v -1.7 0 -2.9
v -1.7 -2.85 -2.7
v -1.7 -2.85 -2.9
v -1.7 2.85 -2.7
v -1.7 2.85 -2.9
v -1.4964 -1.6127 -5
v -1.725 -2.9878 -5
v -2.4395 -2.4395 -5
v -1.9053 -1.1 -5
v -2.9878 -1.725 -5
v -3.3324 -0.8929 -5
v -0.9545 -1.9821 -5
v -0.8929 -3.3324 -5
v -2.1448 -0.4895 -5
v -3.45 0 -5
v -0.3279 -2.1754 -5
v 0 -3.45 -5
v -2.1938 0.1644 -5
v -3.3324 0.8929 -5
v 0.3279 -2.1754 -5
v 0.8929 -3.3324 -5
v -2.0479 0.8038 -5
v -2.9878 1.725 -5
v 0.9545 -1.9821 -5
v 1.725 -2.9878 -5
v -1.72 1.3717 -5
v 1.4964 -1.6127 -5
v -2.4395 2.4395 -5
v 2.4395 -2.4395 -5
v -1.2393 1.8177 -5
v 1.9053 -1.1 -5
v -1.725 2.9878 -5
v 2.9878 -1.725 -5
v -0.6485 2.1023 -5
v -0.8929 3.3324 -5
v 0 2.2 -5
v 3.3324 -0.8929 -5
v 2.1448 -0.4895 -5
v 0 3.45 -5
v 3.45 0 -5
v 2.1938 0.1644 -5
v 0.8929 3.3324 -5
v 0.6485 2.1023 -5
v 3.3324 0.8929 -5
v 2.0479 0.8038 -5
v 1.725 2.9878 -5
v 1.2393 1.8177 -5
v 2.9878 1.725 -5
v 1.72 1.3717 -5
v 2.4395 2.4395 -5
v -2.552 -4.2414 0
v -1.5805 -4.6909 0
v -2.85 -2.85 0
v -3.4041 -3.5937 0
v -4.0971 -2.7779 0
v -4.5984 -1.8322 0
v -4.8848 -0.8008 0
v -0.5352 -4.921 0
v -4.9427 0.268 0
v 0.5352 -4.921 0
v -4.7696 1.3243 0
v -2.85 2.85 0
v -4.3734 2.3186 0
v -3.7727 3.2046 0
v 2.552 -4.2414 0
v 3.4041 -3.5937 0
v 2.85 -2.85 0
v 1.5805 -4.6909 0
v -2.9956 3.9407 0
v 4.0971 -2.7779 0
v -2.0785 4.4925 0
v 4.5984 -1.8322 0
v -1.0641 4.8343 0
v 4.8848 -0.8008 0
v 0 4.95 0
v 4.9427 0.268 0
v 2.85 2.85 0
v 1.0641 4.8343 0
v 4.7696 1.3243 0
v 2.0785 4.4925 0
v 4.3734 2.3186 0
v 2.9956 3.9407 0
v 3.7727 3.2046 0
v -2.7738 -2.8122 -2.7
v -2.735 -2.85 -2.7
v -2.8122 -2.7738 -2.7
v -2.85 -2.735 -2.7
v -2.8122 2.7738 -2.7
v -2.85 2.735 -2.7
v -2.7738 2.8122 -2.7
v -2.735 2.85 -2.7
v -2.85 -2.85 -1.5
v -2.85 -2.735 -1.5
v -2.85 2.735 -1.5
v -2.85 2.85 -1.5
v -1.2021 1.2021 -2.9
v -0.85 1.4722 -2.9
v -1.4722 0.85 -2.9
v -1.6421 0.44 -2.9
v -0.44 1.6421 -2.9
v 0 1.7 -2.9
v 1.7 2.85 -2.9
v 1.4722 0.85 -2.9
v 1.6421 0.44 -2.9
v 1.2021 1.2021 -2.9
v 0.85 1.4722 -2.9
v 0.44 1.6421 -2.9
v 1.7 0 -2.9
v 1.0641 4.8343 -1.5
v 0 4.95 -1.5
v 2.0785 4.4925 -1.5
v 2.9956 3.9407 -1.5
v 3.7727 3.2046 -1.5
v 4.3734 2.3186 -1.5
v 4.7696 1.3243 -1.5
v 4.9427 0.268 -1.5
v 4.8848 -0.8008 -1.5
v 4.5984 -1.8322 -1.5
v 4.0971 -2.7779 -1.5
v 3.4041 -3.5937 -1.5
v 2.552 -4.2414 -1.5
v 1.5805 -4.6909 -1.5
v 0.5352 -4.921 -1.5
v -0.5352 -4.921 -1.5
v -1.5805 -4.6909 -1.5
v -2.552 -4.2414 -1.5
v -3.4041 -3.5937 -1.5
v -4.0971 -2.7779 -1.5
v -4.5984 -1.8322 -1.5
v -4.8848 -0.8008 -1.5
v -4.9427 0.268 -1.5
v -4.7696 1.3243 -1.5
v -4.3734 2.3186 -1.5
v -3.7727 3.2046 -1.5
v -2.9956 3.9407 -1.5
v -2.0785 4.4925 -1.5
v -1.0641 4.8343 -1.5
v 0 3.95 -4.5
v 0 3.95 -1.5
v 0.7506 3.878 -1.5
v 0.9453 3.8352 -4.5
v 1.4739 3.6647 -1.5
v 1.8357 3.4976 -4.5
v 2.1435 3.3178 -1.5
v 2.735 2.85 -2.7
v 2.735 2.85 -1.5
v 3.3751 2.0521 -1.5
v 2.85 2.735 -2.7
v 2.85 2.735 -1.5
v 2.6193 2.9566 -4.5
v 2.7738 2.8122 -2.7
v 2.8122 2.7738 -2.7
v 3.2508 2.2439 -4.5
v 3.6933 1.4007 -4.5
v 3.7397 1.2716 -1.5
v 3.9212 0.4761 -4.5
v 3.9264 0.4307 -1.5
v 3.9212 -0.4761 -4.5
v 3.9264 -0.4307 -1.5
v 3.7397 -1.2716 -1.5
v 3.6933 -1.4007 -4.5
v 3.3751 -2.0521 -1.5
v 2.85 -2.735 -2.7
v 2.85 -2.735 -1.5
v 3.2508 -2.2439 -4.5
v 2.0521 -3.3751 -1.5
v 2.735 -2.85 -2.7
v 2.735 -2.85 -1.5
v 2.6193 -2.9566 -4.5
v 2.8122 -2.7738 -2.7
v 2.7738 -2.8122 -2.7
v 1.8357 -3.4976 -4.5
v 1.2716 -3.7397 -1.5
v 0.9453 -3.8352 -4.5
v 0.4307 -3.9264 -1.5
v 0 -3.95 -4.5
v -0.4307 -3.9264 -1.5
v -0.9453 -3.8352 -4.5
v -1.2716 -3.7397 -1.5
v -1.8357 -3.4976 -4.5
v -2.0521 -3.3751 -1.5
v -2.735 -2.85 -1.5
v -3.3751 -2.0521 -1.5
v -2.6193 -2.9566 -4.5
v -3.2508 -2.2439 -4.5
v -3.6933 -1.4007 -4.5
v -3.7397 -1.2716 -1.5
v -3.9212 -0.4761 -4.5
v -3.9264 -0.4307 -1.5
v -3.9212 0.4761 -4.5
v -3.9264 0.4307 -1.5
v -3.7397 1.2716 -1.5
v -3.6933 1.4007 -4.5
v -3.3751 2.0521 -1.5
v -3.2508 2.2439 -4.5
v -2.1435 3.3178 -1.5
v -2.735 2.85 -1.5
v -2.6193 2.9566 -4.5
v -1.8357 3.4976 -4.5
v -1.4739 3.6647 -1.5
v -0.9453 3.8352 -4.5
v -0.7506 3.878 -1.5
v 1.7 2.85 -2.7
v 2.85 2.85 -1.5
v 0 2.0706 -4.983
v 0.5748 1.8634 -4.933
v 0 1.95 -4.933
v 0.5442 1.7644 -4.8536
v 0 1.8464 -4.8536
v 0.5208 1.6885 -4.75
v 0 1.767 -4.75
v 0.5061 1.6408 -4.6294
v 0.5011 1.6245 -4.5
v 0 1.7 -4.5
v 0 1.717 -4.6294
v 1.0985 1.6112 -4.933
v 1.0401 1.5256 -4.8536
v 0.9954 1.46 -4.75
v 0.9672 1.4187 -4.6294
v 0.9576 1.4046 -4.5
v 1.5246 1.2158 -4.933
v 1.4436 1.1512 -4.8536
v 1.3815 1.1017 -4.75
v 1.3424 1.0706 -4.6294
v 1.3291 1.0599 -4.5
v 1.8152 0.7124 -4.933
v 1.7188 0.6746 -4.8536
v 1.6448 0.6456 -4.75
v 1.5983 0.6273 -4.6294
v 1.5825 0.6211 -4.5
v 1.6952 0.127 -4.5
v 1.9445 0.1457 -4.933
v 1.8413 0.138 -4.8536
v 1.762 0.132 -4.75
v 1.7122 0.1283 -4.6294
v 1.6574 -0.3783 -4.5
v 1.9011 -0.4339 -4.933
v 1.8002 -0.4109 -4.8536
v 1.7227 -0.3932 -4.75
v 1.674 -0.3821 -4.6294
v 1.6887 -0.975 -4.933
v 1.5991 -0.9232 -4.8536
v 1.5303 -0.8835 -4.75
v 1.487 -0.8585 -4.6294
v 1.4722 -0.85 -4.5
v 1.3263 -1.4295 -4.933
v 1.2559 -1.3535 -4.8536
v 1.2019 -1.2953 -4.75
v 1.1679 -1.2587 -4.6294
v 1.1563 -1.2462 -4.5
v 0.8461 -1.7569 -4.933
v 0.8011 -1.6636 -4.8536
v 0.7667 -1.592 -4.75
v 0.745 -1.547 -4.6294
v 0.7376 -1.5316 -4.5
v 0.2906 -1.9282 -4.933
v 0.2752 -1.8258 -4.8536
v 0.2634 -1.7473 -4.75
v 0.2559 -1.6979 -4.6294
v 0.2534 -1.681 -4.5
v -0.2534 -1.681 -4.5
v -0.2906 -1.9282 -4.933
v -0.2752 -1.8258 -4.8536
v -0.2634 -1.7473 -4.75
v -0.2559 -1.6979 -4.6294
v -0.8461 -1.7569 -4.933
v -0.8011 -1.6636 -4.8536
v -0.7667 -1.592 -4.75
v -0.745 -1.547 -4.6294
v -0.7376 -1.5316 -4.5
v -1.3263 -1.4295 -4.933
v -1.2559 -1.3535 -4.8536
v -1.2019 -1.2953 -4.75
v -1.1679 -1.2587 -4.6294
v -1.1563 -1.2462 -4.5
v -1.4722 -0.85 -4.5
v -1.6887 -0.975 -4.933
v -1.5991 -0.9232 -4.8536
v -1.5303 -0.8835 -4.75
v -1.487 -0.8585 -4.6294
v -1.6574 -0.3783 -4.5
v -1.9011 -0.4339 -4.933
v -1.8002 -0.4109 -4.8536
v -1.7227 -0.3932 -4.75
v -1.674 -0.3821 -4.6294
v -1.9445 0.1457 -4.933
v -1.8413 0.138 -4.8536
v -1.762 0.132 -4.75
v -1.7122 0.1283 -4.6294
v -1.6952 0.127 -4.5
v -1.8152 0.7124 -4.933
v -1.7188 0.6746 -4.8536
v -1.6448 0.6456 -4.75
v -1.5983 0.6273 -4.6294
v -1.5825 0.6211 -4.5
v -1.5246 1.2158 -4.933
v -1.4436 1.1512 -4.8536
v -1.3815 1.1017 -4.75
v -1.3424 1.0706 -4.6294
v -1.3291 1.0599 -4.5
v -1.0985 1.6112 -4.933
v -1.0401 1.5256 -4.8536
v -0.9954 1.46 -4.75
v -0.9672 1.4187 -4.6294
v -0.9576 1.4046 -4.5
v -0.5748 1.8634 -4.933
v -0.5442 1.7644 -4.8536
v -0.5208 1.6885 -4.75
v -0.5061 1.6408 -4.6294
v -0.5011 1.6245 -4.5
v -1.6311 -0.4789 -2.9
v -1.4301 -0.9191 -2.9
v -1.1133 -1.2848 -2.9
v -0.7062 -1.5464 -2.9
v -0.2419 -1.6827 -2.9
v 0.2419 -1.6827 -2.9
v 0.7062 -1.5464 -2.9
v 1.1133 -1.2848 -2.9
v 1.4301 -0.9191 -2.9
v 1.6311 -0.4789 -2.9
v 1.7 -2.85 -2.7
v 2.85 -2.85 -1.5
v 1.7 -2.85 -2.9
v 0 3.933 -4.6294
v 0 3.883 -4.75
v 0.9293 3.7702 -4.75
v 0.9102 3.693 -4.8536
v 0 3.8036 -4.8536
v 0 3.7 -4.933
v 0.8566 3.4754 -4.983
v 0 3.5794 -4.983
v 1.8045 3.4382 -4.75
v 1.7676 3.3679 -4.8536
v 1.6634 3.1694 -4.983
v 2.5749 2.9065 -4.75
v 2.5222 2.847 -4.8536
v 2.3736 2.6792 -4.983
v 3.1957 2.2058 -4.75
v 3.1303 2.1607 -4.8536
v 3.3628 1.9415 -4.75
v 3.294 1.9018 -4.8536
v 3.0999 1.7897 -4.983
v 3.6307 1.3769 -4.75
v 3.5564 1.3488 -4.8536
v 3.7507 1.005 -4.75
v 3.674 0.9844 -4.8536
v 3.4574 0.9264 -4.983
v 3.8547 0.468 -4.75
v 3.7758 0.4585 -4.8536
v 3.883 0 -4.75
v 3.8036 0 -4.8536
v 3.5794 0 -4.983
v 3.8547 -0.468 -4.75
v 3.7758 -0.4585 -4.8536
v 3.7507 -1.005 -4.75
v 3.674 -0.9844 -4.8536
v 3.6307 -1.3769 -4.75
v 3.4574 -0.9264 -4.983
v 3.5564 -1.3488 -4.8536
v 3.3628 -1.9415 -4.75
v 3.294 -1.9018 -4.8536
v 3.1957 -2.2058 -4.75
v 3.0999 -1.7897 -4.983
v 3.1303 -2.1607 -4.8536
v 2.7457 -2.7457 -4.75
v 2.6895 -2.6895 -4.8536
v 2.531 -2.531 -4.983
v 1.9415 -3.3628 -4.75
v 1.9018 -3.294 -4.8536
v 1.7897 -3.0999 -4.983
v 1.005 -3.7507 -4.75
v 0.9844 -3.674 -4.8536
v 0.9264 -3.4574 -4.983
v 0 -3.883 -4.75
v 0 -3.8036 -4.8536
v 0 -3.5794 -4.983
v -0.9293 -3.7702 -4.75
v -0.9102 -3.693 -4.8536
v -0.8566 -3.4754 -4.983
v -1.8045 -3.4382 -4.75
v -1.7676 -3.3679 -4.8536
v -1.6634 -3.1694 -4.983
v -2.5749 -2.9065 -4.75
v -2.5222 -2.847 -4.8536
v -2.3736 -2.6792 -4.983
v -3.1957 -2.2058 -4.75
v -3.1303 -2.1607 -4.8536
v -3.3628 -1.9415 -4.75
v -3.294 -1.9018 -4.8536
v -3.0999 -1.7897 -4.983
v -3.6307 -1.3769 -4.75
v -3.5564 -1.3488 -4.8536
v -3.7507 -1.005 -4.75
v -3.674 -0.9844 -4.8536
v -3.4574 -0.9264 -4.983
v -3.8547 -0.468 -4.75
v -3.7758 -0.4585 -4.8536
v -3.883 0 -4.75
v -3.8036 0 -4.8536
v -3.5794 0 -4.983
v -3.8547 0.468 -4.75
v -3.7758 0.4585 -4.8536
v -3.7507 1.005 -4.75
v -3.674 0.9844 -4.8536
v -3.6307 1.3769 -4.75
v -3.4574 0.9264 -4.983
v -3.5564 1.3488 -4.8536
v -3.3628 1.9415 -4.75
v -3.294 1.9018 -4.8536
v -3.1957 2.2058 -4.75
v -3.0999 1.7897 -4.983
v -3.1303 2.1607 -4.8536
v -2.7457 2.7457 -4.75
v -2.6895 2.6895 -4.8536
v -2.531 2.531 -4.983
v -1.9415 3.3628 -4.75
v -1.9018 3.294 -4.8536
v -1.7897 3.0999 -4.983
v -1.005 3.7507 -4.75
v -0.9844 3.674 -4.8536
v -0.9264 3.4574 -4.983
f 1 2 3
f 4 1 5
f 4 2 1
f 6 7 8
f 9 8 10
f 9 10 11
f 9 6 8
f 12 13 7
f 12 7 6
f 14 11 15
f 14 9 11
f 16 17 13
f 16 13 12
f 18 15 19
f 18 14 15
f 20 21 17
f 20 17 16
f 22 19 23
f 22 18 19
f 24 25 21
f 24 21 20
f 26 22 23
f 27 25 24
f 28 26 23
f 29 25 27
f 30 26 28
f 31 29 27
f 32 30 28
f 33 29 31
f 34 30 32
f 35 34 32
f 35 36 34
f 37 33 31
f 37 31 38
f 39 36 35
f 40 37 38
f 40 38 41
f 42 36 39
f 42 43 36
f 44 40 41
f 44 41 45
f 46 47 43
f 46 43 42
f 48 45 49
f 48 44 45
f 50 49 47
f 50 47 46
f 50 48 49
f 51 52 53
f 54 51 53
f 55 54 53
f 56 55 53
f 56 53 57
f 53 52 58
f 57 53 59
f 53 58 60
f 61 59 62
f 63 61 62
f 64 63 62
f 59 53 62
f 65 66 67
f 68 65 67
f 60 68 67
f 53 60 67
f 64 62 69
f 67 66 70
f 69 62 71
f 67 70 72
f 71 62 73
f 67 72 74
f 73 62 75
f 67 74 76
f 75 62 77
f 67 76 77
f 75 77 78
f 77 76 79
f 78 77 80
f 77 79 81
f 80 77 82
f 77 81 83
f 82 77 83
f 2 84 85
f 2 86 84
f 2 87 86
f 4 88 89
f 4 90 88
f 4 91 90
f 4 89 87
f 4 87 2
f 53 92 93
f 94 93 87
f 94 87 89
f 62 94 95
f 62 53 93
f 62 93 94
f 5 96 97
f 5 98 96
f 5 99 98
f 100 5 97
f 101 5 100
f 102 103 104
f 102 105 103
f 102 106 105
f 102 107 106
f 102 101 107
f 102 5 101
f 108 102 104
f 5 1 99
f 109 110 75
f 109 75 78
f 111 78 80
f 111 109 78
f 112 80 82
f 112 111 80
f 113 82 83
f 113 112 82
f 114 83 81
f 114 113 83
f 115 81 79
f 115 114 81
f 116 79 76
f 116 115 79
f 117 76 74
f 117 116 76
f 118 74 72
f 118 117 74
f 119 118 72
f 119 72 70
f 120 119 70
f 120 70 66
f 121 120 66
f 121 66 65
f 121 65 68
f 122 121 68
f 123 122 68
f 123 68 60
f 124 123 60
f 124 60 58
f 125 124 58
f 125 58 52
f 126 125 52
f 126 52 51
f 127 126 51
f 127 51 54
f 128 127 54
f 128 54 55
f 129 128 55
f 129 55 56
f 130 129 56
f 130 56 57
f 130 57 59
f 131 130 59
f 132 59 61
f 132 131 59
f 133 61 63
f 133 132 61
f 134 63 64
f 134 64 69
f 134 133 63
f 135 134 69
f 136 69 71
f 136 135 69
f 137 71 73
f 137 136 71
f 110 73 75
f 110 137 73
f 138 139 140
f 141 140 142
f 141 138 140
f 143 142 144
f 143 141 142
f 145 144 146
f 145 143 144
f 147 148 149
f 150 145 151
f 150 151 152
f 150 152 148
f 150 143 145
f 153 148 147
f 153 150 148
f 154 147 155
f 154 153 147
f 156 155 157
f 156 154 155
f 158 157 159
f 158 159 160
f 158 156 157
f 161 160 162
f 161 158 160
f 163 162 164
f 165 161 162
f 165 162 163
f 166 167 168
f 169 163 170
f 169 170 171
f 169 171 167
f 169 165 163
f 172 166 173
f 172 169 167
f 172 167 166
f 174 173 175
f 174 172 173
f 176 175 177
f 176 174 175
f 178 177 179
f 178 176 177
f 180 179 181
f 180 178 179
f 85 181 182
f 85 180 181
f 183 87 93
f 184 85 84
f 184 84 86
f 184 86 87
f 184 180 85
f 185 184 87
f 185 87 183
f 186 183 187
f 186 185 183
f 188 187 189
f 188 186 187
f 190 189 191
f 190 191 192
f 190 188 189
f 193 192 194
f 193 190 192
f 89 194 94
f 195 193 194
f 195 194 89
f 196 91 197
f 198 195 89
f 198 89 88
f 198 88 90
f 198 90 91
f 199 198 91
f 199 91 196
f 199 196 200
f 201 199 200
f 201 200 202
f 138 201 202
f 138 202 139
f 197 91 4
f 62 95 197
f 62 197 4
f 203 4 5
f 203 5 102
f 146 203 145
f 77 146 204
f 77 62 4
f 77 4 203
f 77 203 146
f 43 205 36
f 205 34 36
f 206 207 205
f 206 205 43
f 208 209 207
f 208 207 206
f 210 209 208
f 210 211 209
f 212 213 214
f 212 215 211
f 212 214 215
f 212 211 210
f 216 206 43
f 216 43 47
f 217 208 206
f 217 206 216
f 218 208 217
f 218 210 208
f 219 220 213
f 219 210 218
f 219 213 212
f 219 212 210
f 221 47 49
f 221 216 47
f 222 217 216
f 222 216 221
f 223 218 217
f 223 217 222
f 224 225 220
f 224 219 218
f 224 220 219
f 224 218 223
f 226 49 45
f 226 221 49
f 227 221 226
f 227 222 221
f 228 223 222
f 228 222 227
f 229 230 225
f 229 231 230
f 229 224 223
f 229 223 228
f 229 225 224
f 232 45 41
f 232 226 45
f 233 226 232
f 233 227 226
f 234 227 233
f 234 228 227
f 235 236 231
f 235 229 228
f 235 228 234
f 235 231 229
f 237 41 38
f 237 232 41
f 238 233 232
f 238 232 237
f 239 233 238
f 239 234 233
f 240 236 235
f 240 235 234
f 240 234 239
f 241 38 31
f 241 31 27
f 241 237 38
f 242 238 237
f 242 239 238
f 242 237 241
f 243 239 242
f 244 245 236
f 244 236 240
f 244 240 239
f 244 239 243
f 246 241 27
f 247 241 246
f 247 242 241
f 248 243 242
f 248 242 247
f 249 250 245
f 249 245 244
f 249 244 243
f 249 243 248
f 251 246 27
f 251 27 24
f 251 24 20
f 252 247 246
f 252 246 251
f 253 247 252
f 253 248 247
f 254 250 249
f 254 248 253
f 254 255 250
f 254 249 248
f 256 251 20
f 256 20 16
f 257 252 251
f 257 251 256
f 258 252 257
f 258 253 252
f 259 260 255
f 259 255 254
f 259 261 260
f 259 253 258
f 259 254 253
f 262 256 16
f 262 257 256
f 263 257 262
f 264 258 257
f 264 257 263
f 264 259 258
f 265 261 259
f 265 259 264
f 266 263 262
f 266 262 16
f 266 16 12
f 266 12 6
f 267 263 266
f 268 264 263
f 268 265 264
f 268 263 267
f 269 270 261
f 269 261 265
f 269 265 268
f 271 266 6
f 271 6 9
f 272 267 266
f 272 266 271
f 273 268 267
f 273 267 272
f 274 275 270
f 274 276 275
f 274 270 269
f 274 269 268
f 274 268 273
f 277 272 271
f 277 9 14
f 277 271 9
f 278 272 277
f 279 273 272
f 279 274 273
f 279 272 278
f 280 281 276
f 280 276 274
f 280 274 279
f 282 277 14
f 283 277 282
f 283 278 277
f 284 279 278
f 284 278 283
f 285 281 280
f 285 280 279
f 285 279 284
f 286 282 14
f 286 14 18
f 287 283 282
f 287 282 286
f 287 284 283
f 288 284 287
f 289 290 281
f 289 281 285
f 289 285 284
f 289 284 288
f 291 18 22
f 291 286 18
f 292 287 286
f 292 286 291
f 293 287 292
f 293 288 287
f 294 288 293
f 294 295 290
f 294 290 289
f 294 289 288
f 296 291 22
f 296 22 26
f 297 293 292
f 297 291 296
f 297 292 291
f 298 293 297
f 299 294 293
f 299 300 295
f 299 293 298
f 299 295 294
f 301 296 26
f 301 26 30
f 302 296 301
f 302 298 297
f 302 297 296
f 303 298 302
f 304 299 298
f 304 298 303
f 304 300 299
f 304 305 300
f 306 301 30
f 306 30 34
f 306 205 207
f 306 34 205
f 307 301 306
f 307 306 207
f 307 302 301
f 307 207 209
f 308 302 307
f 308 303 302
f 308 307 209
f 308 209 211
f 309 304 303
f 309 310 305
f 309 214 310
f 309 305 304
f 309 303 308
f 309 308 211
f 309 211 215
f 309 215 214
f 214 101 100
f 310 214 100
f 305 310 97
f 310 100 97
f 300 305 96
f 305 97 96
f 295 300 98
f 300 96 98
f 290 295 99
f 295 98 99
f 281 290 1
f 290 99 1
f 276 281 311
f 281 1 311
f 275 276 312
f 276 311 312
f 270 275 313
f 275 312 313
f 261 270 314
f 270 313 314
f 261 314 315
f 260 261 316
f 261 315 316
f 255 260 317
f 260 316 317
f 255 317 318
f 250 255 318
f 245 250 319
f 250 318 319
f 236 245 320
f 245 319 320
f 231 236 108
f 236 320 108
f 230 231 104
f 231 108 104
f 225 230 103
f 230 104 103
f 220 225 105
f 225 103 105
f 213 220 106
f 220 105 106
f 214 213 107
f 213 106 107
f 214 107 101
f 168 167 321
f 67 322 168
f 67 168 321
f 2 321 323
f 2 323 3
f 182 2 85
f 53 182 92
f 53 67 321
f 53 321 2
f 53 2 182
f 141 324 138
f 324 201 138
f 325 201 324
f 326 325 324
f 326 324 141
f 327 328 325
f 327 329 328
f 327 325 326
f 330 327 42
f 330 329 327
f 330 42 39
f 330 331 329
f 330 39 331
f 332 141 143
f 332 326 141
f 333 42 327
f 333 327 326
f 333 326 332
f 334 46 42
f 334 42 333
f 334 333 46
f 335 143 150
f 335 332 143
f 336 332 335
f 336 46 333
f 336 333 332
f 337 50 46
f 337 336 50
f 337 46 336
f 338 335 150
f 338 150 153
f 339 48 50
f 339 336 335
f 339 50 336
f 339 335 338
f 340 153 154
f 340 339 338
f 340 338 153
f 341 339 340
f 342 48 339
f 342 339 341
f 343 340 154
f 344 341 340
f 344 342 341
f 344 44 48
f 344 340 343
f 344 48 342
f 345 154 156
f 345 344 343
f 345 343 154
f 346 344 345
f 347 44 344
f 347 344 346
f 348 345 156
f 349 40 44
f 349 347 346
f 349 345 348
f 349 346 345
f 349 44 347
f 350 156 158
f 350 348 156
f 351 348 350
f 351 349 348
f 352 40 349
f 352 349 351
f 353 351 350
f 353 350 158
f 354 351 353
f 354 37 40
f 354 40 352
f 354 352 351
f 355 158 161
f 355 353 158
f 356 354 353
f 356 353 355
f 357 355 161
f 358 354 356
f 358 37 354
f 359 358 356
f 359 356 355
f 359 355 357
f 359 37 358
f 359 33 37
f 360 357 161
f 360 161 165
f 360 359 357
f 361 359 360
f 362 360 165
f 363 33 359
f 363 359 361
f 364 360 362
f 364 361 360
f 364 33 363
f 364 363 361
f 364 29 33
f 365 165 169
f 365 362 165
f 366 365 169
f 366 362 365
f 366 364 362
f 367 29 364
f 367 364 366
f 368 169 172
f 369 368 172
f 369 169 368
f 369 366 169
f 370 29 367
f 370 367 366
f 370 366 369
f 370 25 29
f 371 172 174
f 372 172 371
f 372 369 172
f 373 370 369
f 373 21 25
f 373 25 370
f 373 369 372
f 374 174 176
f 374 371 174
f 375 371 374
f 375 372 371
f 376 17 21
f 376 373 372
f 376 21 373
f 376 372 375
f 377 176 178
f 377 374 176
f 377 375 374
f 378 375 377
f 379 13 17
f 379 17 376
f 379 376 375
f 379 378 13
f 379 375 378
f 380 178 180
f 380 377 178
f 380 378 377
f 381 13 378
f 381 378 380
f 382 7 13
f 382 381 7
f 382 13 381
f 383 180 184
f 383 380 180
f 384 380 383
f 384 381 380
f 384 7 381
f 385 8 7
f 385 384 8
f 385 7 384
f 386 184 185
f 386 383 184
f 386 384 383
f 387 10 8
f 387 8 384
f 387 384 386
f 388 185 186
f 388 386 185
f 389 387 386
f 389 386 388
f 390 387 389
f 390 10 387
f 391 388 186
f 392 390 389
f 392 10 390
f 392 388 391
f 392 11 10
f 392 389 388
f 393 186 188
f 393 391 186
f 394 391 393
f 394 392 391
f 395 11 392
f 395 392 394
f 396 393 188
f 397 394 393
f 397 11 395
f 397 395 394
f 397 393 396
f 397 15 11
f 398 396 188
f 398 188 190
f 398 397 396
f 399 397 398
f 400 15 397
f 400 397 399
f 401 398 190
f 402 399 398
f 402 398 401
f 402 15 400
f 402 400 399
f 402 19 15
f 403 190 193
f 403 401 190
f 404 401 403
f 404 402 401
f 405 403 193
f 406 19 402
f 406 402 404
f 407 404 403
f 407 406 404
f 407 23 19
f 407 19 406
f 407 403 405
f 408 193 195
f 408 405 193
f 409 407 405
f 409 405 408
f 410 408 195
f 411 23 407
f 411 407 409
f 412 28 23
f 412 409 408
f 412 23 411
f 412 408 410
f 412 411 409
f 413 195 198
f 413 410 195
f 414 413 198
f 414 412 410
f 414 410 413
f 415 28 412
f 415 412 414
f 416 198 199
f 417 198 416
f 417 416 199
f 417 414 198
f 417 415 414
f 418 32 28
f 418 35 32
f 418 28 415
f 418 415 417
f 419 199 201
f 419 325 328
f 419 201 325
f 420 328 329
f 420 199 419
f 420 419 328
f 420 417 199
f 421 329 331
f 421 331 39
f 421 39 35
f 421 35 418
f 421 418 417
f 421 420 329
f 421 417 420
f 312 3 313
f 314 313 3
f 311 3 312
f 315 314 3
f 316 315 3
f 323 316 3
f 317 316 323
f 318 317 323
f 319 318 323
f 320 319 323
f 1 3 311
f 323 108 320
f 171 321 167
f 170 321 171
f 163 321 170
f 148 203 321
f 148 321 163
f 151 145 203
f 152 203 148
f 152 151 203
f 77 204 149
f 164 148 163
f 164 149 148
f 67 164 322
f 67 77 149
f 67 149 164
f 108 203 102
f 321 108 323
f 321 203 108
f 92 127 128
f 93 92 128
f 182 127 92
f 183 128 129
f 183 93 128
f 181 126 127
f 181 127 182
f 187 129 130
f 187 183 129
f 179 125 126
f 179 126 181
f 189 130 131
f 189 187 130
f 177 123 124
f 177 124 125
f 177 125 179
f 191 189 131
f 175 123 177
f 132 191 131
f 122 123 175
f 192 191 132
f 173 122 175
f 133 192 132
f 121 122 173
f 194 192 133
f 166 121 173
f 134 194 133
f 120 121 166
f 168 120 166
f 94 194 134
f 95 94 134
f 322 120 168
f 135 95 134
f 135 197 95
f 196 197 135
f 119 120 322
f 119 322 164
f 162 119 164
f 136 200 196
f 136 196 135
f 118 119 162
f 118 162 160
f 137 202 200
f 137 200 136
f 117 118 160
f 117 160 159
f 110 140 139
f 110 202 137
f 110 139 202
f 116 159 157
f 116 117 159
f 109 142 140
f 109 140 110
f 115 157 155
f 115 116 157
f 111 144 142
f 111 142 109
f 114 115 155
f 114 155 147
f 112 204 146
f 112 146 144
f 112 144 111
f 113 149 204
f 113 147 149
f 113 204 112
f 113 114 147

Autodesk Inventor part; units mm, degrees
ref_plane "YZ Plane" through (0, 0, 0) normal (1, 0, 0) x (0, 1, 0)
ref_plane "XZ Plane" through (0, 0, 0) normal (0, 1, 0) x (-1, 0, 0)
ref_plane "XY Plane" through (0, 0, 0) normal (0, 0, 1) x (1, 0, 0)
sketch "Sketch1" plane through (0, 0, 0) normal (1, 0, 0) x (0, 1, 0)
  line L0 (0, 0) -> (1.7, 0) construction
  line L1 (1.7, 0) -> (4.95, 0)
  line L2 (4.95, 0) -> (4.95, -1.5)
  line L3 (4.95, -1.5) -> (3.95, -1.5)
  line L4 (3.95, -1.5) -> (3.95, -5)
  line L5 (3.95, -5) -> (1.7, -5)
  line L6 (1.7, -5) -> (1.7, 0)
  line L7 (0, 0) -> (0, -13.7466) construction
  dimension "d0" = 1.7
  dimension "d1" = 3.95
  dimension "d2" = 1
  dimension "d3" = 1.5
  dimension "d4" = 3.5
revolve "Revolution1" add sketch "Sketch1" angle 360 about axis through (0, 0, 0) along (0, 0, -1)
sketch "Sketch2" plane through (0, 0, 0) normal (0, 0, 1) x (1, 0, 0)
  line L0 (2.85, -2.85) -> (-2.85, -2.85)
  line L1 (-2.85, -2.85) -> (-2.85, 2.85)
  line L2 (-2.85, 2.85) -> (2.85, 2.85)
  line L3 (2.85, 2.85) -> (2.85, -2.85)
  line L4 (2.85, -2.85) -> (-2.85, 2.85) construction
  line L5 (-2.85, -2.85) -> (2.85, 2.85) construction
  point P0 (0, 0)
  dimension "d6" = 5.7
extrude "Extrusion1" cut sketch "Sketch2" against normal blind 2.7
fillet "Fillet1" radius 0.5 2 edges at (0, -3.95, -5) (0, -1.7, -5)
sketch "Sketch3" plane through (0, 0, -2.7) normal (0, 0, 1) x (1, 0, 0)
  line L0 (-2.85, 2.85) -> (2.85, 2.85) projected
  line L1 (2.735, -2.85) -> (-2.735, -2.85) projected
  line L2 (-1.7, 2.85) -> (1.7, 2.85)
  line L3 (1.7, 2.85) -> (1.7, -2.85)
  line L4 (1.7, -2.85) -> (-1.7, -2.85)
  line L5 (-1.7, -2.85) -> (-1.7, 2.85)
  arc A0 (-2.85, -2.735) -> (-2.735, -2.85) centre (0, 0) ccw projected
  line L6 (2.735, -2.85) -> (-2.735, -2.85) projected
  arc A1 (2.735, -2.85) -> (2.85, -2.735) centre (0, 0) ccw projected
  line L7 (2.85, 2.735) -> (2.85, -2.735) projected
  arc A2 (2.85, 2.735) -> (2.735, 2.85) centre (0, 0) ccw projected
  line L8 (-2.735, 2.85) -> (2.735, 2.85) projected
  arc A3 (-2.735, 2.85) -> (-2.85, 2.735) centre (0, 0) ccw projected
  line L9 (-2.85, -2.735) -> (-2.85, 2.735) projected
  circle A4 centre (0, 0) radius 1.7 projected
  point P0 (-1.7, 0)
  point P1 (1.7, 0)
  point P2 (1.7, 2.85)
extrude "Extrusion2" cut sketch "Sketch3" against normal blind 0.2 contours L0 L3 A4 L5 | A4 L3 L1 L5
properties part number "HD_BearingShaft1"
